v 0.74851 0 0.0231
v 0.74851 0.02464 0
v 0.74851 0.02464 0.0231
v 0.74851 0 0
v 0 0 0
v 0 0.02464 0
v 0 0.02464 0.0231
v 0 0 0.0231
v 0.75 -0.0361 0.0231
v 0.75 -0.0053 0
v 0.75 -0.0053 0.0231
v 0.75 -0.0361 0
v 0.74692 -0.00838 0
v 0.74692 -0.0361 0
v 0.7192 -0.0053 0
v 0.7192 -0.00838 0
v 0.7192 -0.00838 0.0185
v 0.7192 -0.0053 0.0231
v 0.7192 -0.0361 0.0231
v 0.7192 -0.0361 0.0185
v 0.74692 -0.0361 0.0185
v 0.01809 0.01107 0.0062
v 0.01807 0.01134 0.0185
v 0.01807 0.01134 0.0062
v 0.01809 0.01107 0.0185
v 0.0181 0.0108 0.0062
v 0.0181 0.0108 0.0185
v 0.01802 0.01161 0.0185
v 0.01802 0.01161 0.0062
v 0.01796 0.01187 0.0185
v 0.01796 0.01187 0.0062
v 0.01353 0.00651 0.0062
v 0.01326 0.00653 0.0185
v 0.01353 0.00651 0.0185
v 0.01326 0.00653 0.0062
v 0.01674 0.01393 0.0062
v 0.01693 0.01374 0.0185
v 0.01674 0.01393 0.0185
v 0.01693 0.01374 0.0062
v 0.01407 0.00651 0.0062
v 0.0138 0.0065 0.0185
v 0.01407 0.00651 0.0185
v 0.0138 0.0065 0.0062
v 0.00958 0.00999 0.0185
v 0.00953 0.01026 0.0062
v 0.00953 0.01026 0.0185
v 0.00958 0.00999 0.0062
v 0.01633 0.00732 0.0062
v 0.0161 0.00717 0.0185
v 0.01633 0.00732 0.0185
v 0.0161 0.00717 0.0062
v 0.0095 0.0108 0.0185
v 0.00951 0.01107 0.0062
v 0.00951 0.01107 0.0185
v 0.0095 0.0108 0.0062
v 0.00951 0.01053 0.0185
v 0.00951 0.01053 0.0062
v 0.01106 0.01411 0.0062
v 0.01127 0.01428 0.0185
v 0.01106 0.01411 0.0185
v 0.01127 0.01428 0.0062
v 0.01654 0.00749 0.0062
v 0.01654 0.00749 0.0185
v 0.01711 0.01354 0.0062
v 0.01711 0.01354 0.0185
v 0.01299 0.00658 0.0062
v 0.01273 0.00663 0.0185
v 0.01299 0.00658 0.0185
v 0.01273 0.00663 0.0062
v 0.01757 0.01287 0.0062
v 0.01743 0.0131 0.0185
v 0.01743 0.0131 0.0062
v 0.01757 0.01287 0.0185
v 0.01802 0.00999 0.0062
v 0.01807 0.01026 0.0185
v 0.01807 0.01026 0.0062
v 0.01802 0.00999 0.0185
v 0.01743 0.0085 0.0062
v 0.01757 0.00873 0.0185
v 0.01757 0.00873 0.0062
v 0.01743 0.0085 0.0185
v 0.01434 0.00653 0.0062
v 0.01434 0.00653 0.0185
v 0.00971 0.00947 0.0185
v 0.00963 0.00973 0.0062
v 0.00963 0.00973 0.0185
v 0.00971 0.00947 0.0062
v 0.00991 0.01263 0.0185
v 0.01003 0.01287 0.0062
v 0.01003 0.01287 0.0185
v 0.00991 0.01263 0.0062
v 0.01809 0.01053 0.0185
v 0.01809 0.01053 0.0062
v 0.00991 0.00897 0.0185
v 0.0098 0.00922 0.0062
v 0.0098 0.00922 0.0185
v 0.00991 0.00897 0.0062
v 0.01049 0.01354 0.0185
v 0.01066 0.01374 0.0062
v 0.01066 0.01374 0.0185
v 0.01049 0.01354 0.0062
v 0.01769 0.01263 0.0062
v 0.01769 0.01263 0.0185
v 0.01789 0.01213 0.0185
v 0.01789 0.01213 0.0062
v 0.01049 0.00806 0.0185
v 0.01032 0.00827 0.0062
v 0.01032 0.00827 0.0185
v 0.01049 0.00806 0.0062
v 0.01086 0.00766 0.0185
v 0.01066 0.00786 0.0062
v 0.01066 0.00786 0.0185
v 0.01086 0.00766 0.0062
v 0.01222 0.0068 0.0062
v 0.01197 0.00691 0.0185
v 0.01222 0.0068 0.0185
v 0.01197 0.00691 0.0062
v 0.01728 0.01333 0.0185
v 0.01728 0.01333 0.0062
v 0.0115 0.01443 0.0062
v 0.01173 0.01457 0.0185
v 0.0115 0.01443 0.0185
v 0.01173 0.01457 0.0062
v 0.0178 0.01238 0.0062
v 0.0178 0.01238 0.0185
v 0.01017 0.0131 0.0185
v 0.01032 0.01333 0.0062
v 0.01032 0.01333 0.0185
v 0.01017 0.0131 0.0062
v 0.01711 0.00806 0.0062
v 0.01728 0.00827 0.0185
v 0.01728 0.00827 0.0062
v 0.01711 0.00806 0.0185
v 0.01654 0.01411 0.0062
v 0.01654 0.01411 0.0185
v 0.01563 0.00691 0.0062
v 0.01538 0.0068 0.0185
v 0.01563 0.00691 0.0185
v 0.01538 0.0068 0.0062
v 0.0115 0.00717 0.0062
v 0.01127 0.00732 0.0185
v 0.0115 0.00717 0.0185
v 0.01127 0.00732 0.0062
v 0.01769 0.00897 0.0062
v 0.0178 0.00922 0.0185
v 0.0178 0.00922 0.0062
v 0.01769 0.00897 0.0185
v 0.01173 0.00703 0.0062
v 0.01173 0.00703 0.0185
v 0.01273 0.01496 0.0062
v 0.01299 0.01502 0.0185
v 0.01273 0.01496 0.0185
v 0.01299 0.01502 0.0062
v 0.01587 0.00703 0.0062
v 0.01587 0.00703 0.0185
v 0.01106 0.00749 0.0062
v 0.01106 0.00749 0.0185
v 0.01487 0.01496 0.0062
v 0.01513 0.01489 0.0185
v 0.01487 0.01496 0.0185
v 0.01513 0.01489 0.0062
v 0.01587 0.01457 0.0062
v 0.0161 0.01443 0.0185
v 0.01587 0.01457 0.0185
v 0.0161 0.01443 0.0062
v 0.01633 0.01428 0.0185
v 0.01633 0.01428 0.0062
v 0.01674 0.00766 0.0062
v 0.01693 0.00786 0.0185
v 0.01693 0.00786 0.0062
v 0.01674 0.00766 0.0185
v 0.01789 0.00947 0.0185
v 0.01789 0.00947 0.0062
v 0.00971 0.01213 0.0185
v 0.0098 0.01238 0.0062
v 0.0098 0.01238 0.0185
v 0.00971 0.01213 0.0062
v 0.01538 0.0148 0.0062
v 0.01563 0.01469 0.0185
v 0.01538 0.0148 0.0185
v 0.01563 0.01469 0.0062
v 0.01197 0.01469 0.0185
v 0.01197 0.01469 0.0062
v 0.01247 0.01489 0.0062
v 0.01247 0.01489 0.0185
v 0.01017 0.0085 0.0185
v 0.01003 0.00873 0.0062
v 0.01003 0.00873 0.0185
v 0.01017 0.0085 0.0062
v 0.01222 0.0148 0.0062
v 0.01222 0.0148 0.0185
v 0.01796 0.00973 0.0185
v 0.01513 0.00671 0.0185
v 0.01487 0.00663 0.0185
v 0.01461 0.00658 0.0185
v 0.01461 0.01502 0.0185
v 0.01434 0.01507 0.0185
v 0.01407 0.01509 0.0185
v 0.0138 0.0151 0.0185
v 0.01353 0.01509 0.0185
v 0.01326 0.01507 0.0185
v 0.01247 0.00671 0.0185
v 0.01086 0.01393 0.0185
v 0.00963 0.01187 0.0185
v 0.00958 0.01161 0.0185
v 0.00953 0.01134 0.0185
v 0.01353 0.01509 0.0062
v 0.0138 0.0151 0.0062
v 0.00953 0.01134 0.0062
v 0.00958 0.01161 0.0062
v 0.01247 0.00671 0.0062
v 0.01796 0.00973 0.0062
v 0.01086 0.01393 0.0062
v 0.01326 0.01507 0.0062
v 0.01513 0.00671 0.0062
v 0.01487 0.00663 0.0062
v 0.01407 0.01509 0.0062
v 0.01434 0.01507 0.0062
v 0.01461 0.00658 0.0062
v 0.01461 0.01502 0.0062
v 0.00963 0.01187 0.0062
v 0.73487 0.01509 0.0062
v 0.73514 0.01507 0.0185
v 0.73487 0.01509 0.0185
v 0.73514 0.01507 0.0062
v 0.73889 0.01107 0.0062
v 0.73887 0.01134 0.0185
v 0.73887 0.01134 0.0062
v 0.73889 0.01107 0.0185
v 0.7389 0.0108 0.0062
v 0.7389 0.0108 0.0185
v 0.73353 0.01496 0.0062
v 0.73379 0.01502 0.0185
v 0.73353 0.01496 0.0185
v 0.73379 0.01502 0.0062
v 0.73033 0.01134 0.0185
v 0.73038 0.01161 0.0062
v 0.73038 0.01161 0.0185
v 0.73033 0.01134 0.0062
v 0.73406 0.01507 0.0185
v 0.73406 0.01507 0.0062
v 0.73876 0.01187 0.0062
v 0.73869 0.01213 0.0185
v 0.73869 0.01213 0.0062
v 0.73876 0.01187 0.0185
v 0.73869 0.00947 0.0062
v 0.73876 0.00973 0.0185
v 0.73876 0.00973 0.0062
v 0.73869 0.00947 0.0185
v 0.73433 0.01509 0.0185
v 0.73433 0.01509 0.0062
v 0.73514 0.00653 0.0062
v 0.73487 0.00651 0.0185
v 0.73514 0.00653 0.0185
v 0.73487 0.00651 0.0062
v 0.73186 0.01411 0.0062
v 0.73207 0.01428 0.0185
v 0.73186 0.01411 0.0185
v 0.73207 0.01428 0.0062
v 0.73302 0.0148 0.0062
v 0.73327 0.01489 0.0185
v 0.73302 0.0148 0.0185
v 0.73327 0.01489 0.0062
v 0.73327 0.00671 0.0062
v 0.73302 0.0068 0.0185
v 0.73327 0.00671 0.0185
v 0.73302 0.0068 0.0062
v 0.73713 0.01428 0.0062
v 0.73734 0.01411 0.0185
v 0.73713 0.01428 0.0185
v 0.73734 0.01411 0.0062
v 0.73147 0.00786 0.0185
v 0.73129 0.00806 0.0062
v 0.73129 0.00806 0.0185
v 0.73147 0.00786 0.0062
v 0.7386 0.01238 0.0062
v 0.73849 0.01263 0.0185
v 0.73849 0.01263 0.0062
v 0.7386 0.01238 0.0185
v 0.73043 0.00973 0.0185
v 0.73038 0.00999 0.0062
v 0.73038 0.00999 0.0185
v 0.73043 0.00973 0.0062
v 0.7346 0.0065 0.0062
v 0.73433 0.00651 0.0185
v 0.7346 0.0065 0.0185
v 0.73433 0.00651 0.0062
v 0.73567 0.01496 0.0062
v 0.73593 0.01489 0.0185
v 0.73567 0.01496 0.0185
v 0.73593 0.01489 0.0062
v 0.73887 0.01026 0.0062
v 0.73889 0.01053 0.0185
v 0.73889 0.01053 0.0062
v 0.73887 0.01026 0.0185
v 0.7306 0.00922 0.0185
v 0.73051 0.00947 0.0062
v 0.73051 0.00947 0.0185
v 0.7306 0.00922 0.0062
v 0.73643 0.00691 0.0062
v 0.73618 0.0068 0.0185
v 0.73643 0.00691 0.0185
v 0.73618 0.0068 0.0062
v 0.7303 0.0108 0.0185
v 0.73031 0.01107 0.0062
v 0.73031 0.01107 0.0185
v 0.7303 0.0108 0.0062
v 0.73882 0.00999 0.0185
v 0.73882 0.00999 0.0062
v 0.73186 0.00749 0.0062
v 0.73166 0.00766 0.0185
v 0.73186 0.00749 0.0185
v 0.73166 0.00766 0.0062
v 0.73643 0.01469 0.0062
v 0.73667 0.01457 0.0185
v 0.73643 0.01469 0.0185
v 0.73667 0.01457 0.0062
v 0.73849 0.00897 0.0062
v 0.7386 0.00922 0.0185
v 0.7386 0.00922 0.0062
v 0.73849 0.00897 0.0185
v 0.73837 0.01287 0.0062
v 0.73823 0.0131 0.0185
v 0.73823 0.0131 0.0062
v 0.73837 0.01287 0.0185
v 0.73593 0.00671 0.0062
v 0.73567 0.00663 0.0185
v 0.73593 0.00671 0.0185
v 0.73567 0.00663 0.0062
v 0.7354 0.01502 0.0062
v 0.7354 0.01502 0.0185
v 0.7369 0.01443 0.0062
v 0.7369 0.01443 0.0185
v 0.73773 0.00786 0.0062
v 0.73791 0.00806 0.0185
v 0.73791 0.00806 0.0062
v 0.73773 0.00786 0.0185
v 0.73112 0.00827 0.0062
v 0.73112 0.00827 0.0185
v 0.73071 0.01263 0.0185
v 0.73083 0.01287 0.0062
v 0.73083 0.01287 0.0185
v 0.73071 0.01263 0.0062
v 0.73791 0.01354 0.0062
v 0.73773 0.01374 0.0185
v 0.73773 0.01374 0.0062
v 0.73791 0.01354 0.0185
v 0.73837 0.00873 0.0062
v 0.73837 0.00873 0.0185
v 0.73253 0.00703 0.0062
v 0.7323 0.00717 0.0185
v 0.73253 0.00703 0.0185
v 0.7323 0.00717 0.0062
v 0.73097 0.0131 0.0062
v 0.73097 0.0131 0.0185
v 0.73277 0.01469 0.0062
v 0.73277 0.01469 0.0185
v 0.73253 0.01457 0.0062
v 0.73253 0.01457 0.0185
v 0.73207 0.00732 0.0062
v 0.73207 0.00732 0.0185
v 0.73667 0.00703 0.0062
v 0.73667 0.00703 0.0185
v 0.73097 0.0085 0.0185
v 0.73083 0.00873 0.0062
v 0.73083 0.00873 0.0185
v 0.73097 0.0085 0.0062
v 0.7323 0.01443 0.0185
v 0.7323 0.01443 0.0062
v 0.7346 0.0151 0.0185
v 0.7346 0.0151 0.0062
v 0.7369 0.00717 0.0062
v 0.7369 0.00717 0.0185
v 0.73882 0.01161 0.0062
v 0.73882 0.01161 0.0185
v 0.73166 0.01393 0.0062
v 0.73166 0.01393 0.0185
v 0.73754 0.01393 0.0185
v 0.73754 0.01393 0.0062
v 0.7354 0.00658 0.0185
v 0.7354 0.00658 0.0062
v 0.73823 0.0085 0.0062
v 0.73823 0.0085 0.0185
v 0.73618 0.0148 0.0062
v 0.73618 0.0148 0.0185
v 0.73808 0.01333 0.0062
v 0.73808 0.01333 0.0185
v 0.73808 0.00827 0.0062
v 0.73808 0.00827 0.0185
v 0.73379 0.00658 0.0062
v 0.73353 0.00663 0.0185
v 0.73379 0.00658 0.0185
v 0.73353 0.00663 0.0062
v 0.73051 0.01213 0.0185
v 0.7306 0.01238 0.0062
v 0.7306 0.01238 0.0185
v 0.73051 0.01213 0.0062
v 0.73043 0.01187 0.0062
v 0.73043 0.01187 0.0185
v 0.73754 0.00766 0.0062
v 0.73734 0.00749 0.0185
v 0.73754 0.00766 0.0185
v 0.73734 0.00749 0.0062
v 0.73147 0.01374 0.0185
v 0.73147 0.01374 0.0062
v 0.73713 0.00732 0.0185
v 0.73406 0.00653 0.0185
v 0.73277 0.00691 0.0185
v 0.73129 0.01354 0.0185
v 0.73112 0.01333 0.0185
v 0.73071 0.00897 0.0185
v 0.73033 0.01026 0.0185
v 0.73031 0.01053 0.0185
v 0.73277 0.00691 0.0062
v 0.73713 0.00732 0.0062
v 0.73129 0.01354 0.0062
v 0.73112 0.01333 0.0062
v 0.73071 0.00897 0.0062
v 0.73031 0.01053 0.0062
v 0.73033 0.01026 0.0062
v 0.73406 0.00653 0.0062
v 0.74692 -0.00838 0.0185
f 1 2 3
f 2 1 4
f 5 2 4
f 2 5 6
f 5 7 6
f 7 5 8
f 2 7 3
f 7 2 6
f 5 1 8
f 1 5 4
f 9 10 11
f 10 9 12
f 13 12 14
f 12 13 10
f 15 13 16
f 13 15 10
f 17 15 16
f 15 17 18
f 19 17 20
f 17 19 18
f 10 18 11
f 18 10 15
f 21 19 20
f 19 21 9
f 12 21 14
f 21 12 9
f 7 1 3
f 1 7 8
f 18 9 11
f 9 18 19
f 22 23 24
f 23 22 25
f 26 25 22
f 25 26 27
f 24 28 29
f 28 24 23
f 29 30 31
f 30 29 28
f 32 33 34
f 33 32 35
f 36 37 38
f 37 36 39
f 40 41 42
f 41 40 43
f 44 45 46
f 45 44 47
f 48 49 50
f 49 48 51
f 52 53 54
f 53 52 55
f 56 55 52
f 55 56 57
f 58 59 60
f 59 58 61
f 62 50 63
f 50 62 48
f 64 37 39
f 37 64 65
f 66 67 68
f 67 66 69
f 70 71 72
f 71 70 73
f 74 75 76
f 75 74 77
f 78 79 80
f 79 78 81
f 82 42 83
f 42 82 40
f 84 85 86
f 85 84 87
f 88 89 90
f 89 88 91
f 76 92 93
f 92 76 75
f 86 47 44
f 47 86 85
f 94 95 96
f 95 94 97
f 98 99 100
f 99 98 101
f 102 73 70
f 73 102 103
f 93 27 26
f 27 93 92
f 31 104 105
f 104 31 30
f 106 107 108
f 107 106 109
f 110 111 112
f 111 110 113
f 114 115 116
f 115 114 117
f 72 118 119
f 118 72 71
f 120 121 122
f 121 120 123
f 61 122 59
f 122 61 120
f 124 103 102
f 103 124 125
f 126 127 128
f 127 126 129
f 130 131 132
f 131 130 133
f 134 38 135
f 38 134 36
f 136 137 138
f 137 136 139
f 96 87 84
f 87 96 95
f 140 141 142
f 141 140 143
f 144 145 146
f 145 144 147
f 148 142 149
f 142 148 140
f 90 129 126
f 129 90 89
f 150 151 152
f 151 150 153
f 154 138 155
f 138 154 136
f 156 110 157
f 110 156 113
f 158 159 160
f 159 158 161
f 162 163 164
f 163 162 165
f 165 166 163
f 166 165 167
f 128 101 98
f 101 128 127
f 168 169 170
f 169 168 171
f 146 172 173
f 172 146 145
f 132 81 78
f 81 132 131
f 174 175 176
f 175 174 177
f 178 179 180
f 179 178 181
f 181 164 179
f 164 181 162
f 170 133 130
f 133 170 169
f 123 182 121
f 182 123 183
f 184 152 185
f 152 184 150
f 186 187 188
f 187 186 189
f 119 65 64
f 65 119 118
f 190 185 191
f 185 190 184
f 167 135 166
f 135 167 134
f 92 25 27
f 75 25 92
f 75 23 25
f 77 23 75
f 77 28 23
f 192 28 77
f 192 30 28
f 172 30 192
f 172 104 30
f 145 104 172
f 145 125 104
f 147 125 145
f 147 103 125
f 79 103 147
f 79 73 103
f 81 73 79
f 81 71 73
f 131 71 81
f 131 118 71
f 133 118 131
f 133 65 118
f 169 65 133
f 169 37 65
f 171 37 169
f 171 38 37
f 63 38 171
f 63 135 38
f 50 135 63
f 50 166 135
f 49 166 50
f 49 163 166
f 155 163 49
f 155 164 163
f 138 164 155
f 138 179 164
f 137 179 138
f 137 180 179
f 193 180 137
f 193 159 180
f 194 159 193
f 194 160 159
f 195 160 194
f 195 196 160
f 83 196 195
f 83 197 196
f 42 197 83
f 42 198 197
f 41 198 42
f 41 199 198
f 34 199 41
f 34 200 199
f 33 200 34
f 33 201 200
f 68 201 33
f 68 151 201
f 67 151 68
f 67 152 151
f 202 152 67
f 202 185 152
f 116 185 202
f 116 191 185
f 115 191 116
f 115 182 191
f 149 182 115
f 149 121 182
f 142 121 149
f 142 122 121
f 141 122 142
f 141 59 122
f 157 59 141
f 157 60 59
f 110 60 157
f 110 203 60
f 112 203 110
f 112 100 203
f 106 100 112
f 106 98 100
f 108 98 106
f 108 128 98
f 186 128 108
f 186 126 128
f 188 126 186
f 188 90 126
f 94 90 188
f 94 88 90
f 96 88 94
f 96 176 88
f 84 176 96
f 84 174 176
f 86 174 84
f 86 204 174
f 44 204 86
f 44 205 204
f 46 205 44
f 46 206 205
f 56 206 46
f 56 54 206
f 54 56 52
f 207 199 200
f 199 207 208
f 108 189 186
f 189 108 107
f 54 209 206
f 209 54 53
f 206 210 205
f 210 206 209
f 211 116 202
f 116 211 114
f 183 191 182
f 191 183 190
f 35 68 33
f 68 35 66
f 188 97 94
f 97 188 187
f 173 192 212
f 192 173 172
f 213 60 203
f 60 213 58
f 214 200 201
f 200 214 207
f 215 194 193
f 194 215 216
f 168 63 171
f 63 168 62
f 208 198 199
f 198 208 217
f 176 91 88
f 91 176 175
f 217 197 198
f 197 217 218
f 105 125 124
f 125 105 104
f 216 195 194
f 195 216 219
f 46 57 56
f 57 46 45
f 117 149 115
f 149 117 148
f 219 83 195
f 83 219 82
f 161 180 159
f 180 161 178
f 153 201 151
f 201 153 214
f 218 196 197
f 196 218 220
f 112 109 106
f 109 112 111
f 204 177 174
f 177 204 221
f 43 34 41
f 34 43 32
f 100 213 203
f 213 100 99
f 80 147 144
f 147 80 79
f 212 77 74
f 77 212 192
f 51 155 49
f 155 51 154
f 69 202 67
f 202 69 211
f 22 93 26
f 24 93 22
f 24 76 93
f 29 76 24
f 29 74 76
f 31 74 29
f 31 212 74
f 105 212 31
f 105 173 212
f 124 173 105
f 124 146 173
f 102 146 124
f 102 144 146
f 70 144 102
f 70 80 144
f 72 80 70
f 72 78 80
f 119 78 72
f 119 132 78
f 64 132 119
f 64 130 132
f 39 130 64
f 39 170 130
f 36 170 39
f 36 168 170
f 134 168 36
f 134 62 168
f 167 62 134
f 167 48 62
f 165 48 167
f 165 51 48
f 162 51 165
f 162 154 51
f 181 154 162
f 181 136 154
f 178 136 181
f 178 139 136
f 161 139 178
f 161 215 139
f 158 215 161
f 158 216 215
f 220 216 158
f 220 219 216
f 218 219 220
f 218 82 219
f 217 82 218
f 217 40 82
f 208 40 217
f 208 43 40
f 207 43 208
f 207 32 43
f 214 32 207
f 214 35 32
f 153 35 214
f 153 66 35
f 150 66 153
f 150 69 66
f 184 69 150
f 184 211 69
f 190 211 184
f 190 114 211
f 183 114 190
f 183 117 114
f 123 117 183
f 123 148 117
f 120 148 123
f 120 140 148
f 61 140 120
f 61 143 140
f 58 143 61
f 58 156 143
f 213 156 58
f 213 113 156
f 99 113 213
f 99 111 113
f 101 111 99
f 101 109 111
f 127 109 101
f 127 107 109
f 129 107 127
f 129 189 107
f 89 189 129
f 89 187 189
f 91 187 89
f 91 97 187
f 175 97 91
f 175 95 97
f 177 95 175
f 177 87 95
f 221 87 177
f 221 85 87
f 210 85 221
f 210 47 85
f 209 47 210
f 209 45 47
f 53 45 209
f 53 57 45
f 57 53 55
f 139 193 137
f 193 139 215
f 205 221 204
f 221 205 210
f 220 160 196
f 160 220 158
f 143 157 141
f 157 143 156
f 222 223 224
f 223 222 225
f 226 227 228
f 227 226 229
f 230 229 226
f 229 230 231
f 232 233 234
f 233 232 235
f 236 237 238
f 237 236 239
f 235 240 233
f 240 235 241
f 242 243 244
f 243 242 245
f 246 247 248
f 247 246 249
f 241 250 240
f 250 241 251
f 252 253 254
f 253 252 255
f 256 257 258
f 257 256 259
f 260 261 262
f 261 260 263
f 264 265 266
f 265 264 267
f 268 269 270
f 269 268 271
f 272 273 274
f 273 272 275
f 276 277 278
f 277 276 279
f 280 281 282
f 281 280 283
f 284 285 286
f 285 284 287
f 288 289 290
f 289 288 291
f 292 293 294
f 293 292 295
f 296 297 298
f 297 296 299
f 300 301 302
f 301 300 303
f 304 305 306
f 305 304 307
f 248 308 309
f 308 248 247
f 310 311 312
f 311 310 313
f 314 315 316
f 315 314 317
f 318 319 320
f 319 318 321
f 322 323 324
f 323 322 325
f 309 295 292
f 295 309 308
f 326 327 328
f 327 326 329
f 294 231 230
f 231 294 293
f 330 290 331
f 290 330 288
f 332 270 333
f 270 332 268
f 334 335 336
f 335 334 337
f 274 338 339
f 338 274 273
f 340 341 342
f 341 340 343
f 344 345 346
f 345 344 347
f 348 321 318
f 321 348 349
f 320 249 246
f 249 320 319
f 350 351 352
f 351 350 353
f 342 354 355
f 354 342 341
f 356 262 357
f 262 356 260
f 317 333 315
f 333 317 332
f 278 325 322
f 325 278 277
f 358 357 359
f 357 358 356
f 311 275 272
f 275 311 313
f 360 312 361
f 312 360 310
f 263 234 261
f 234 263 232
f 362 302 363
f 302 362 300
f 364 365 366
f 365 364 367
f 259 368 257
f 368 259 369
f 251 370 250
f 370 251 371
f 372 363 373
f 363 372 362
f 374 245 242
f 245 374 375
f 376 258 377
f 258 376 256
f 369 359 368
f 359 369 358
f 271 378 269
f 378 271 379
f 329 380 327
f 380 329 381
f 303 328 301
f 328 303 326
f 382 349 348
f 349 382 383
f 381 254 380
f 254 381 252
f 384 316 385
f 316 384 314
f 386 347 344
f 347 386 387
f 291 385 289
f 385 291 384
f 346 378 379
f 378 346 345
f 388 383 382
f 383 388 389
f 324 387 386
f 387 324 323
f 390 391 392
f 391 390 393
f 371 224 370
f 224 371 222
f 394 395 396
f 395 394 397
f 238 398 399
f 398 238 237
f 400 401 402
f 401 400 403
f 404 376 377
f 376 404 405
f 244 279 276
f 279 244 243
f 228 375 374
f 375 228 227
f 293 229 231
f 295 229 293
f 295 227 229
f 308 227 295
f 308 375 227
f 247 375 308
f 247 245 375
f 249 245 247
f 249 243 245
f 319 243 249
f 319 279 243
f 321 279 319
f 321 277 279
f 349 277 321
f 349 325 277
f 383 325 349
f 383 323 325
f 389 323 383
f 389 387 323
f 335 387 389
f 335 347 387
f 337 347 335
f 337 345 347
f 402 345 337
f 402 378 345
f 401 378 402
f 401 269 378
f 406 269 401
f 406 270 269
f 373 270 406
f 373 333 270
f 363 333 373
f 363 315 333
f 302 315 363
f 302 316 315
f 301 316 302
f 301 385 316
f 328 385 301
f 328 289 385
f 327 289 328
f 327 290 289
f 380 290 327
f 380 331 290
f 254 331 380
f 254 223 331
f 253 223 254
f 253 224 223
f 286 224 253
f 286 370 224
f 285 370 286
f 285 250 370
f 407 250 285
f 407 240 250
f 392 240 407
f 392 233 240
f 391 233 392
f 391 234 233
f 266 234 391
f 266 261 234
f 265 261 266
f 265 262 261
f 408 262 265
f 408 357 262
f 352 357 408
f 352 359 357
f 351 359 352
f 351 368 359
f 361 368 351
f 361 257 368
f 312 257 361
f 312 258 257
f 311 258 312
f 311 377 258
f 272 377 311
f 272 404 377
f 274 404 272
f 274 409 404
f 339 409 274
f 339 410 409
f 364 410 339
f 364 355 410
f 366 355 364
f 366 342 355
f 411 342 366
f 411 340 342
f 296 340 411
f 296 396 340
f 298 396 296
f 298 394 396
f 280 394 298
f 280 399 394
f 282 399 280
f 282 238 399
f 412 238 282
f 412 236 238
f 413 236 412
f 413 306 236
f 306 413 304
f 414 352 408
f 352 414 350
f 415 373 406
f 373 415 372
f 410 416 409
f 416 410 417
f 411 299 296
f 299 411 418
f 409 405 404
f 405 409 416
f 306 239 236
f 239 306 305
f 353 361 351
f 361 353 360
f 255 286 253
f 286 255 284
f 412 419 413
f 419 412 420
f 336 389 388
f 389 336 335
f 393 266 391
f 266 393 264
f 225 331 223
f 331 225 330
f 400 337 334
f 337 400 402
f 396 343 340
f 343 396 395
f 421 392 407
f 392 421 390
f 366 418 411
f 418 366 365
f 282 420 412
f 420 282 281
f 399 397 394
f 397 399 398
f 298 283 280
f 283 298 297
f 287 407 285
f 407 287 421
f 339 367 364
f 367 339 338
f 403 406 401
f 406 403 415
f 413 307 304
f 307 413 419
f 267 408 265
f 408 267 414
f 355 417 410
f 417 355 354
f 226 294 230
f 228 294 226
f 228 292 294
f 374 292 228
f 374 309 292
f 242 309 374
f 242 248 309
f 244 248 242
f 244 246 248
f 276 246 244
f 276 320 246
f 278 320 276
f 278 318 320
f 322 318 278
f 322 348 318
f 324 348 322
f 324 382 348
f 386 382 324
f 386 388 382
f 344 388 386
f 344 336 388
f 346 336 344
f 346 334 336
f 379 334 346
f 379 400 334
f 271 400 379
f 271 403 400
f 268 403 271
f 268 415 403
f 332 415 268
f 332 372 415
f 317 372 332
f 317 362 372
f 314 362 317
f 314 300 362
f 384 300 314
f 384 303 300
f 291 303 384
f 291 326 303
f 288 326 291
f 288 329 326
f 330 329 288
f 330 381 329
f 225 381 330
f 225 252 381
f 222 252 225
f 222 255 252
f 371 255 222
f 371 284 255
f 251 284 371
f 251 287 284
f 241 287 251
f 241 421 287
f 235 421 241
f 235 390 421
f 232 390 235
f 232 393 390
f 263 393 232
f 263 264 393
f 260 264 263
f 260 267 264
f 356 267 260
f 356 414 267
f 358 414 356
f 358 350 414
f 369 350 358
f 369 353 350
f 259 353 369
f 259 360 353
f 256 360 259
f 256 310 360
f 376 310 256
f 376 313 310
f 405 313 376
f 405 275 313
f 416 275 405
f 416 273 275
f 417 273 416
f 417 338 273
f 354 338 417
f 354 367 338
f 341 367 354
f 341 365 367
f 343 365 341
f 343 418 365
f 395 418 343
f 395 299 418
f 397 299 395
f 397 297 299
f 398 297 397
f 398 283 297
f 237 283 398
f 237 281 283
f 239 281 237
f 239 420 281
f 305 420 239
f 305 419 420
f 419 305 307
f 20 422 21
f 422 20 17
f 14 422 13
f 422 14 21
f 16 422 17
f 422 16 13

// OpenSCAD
// Global Settings
$fn = 100; // Smooth curve resolution

// Rail Parameters
rail_length = 0.748506;       // X-axis length of main rail
rail_width = 0.024642;        // Y-axis width of main rail
rail_lower_height = 0.0185;   // Z-height of lower rail body
rail_upper_thickness = 0.0046;// Z-thickness of upper rail top layer

// Recess Parameters
recess_radius = 0.0043;       // Radius of all circular recesses
recess_height = 0.0123;       // Z-height of recess cut
recess_z_start = 0.0062;      // Z-start position of recess cuts
rail_recess_y_center = 0.0108;// Y-center offset for rail recesses from front edge
rail_recess_x_pos = [0.0138, 0.7346]; // X positions of rail recesses

// End Block Parameters
end_block_size = 0.030803;    // Equal X/Y dimension of end block
end_block_left_x = 0.7192;    // X position of end block left edge
end_block_front_y = -0.0361;  // Y position of end block front edge (front of rail = Y=0)
end_block_recess_x = 0.7361;  // X center of end block recess
end_block_recess_y = -0.0192; // Y center of end block recess

// End Cutout Parameters
cutout_size = 0.027722;       // Equal X/Y dimension of end cutout
cutout_total_height = 0.077;  // Total Z height of cutout
cutout_z_bottom = -0.0585;    // Z bottom position of cutout

// Main Model
difference() {
    // Union of all solid components
    union() {
        // Lower rail body
        cube([rail_length, rail_width, rail_lower_height]);
        
        // Lower end block body
        translate([end_block_left_x, end_block_front_y, 0])
            cube([end_block_size, end_block_size, rail_lower_height]);
        
        // Upper rail top layer
        translate([0, 0, rail_lower_height])
            cube([rail_length, rail_width, rail_upper_thickness]);
        
        // Upper end block top layer
        translate([end_block_left_x, end_block_front_y, rail_lower_height])
            cube([end_block_size, end_block_size, rail_upper_thickness]);
    }
    
    // Cut rail recesses
    for (x = rail_recess_x_pos) {
        translate([x, rail_recess_y_center, recess_z_start])
            cylinder(h=recess_height, r=recess_radius);
    }
    
    // Cut end block recess
    translate([end_block_recess_x, end_block_recess_y, recess_z_start])
        cylinder(h=recess_height, r=recess_radius);
    
    // Cut end block rectangular cutout
    translate([end_block_left_x, end_block_front_y, cutout_z_bottom])
        cube([cutout_size, cutout_size, cutout_total_height]);
}
